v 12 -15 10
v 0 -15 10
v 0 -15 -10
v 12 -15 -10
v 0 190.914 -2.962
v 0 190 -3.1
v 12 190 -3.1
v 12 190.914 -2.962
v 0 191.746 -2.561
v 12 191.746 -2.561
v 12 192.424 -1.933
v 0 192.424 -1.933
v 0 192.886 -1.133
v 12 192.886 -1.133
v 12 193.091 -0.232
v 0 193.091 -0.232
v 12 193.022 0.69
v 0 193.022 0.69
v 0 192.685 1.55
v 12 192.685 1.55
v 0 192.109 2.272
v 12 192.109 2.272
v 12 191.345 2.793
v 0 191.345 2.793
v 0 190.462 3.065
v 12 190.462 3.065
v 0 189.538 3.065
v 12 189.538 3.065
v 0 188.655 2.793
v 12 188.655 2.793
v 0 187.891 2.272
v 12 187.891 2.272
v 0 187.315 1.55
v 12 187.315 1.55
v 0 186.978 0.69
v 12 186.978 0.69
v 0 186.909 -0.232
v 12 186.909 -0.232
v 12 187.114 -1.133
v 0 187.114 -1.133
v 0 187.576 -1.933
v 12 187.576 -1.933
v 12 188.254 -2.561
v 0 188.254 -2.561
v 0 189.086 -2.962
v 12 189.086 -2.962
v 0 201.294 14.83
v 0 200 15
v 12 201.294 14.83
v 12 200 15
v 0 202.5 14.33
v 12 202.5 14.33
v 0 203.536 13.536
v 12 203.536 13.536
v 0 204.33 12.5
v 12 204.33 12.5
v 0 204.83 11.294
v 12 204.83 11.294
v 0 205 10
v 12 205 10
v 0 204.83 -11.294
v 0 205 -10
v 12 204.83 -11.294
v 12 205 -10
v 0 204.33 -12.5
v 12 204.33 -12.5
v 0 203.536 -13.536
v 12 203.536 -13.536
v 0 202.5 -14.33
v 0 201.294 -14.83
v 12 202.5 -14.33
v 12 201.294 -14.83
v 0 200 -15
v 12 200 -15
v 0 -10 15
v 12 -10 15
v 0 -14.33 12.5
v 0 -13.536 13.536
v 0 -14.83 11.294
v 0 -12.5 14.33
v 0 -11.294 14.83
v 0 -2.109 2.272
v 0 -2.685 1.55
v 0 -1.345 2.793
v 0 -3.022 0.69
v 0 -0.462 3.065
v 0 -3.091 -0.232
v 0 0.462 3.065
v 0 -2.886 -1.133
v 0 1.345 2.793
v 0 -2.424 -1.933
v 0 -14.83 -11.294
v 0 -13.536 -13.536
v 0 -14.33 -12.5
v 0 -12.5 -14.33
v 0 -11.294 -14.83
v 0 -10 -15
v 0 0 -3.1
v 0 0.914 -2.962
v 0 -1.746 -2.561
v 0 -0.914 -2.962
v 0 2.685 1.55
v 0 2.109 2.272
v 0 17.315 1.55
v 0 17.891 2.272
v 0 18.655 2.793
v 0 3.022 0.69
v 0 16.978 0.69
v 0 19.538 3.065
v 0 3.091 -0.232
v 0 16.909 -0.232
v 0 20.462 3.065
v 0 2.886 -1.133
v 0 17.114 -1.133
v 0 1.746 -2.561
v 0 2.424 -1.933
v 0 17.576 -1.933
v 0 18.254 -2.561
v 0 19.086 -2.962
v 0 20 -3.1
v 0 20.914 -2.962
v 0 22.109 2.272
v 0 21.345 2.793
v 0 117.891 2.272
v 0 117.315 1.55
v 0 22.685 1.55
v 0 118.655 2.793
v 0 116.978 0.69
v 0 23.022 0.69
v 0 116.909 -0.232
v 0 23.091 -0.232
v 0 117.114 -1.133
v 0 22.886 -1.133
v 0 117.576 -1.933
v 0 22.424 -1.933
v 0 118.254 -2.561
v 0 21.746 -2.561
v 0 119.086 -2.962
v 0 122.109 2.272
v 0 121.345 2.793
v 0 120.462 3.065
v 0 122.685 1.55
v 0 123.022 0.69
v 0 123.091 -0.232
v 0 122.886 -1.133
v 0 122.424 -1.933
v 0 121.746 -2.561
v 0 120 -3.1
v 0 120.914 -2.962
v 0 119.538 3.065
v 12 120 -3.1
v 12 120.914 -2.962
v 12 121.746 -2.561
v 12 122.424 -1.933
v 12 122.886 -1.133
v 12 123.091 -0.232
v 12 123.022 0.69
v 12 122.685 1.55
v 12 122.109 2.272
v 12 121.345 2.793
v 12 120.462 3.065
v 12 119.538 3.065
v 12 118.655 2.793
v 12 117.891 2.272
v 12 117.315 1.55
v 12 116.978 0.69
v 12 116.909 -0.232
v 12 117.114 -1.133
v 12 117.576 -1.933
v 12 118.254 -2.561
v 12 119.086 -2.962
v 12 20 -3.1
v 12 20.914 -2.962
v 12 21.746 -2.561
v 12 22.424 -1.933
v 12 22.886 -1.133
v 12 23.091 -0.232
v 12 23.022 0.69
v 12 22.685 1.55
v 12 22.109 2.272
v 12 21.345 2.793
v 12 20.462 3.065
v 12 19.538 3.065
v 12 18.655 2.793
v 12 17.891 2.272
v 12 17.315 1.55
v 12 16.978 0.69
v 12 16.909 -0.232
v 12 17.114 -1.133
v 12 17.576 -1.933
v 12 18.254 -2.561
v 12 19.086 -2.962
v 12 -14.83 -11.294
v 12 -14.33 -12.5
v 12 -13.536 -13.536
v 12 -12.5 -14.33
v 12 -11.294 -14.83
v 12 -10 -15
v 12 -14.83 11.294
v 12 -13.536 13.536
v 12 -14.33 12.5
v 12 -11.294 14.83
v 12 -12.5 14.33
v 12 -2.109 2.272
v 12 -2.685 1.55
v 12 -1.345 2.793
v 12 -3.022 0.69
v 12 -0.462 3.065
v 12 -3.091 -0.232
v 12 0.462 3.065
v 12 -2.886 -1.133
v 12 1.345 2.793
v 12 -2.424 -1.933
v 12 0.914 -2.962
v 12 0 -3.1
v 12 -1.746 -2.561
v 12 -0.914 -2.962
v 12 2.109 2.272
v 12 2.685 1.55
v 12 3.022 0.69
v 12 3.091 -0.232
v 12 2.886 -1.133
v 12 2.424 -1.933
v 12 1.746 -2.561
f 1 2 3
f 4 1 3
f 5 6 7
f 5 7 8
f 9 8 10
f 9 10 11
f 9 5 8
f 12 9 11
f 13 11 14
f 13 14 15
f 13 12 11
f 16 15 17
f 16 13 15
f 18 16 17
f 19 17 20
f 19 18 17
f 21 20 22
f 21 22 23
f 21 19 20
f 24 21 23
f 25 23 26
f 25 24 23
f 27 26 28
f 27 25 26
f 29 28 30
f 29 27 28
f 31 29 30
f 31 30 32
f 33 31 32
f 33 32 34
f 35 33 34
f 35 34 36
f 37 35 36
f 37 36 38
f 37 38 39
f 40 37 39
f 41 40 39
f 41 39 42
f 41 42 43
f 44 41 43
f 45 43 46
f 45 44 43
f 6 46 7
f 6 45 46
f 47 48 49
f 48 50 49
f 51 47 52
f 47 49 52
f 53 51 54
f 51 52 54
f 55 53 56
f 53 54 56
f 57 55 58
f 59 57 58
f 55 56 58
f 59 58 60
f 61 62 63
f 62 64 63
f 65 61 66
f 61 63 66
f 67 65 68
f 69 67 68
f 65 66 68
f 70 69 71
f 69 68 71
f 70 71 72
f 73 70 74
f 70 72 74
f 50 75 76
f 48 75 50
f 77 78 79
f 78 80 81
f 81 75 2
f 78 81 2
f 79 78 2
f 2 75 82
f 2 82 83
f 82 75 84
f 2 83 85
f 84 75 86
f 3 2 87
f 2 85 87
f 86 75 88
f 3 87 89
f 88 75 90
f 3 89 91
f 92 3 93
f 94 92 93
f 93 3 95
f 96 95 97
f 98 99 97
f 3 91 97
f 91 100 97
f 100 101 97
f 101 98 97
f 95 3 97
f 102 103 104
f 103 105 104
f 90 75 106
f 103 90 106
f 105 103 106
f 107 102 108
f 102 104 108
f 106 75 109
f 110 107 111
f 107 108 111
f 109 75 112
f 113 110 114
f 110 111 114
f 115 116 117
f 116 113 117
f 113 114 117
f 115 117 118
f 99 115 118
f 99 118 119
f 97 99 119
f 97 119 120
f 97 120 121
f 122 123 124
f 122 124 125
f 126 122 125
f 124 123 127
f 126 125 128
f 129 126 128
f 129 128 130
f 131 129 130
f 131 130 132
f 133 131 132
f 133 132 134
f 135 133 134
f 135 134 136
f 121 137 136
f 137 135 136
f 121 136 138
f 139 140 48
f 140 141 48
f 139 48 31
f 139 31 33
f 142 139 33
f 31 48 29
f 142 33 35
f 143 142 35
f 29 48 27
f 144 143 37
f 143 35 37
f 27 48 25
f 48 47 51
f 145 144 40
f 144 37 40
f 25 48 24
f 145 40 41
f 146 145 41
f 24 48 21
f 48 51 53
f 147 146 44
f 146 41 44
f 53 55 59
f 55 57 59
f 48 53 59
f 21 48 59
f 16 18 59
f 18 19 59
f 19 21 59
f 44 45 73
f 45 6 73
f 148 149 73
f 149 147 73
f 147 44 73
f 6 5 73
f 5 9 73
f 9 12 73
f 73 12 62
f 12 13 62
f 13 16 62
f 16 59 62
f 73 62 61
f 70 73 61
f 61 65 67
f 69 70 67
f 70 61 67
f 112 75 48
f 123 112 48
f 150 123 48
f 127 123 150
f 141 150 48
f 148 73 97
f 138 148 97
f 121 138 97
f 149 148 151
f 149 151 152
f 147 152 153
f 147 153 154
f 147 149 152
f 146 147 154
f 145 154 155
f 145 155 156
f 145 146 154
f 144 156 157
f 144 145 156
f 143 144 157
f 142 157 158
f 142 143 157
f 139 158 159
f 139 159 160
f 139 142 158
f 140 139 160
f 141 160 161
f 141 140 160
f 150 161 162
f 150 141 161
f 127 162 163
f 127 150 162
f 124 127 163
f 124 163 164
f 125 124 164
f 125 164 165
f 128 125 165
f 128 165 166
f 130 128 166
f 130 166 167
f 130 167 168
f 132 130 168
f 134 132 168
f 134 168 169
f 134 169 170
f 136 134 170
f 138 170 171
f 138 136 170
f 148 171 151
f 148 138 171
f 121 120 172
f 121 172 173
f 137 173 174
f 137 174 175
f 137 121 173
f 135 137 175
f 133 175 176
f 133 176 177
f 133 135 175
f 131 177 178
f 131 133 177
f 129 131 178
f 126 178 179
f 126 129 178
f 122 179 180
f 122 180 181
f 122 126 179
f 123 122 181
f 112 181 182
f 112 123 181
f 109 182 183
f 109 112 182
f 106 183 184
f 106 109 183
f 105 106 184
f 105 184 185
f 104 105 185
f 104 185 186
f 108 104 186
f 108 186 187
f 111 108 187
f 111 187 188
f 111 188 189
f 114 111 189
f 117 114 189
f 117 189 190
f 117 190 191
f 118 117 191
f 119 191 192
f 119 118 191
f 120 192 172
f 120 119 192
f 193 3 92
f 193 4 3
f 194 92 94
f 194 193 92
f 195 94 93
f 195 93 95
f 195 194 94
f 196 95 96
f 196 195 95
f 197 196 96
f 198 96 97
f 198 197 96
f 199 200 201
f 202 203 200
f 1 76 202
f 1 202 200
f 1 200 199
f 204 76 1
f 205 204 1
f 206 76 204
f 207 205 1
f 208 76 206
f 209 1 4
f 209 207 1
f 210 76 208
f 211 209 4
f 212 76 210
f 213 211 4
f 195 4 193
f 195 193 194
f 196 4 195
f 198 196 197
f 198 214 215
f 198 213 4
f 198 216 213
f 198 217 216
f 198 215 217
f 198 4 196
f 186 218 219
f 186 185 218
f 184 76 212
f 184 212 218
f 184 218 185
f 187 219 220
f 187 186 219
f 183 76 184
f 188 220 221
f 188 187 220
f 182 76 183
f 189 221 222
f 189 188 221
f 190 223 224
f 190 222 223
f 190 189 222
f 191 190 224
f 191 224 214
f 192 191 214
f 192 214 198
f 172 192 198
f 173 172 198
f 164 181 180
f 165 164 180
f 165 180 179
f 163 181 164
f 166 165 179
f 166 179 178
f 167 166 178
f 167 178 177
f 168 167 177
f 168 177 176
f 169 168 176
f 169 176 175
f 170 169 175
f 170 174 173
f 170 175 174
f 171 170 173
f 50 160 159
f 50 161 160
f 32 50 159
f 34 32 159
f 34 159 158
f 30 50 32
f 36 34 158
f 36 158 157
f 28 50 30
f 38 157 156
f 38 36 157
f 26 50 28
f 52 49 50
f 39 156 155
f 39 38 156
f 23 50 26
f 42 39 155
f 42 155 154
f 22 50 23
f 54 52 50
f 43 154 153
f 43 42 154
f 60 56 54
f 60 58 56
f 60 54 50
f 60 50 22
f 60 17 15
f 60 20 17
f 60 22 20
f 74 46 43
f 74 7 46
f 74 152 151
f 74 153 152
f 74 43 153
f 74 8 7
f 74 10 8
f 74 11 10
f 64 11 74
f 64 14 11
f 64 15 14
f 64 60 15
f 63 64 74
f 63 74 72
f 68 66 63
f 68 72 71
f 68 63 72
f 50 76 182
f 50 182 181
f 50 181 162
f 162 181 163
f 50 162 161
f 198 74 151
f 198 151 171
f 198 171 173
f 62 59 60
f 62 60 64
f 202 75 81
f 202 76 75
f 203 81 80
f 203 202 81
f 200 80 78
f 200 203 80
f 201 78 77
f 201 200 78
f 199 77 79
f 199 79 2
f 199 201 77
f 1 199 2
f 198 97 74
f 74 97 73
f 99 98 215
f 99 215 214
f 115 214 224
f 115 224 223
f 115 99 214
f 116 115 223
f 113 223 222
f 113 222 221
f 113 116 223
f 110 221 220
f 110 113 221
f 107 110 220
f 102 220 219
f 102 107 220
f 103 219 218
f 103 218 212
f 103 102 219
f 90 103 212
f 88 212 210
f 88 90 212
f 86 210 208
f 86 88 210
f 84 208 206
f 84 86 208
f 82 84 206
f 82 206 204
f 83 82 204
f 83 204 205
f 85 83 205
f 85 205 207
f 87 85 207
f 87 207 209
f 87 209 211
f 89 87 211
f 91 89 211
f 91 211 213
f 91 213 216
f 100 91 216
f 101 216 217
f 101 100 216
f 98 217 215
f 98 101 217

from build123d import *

# Parameters (mm, degrees)
SKETCH1_W           = 30
SKETCH1_H           = 220
SKETCH1_R           = 3.1
BOSS_EXTRUDE1_DEPTH = 12
FILLET1_R           = 5


with BuildPart() as part:
    # Sketch1 → Boss-Extrude1 (new body)
    with BuildSketch(Plane(origin=(0, 0, 0), x_dir=(0, 0, -1), z_dir=(1, 0, 0))):
        with Locations((0, 95)):
            Rectangle(SKETCH1_W, SKETCH1_H)
        Circle(SKETCH1_R, mode=Mode.SUBTRACT)
        with Locations((0, 20)):
            Circle(SKETCH1_R, mode=Mode.SUBTRACT)
        with Locations((0, 120)):
            Circle(SKETCH1_R, mode=Mode.SUBTRACT)
        with Locations((0, 190)):
            Circle(SKETCH1_R, mode=Mode.SUBTRACT)
    extrude(amount=BOSS_EXTRUDE1_DEPTH)

    # Fillet1
    fillet1_edges = [part.edges().sort_by_distance(p)[0] for p in [
        (6, 205, 15),
        (6, 205, -15),
        (6, -15, -15),
        (6, -15, 15),
    ]]
    fillet(fillet1_edges, radius=FILLET1_R)


solid = part.part
